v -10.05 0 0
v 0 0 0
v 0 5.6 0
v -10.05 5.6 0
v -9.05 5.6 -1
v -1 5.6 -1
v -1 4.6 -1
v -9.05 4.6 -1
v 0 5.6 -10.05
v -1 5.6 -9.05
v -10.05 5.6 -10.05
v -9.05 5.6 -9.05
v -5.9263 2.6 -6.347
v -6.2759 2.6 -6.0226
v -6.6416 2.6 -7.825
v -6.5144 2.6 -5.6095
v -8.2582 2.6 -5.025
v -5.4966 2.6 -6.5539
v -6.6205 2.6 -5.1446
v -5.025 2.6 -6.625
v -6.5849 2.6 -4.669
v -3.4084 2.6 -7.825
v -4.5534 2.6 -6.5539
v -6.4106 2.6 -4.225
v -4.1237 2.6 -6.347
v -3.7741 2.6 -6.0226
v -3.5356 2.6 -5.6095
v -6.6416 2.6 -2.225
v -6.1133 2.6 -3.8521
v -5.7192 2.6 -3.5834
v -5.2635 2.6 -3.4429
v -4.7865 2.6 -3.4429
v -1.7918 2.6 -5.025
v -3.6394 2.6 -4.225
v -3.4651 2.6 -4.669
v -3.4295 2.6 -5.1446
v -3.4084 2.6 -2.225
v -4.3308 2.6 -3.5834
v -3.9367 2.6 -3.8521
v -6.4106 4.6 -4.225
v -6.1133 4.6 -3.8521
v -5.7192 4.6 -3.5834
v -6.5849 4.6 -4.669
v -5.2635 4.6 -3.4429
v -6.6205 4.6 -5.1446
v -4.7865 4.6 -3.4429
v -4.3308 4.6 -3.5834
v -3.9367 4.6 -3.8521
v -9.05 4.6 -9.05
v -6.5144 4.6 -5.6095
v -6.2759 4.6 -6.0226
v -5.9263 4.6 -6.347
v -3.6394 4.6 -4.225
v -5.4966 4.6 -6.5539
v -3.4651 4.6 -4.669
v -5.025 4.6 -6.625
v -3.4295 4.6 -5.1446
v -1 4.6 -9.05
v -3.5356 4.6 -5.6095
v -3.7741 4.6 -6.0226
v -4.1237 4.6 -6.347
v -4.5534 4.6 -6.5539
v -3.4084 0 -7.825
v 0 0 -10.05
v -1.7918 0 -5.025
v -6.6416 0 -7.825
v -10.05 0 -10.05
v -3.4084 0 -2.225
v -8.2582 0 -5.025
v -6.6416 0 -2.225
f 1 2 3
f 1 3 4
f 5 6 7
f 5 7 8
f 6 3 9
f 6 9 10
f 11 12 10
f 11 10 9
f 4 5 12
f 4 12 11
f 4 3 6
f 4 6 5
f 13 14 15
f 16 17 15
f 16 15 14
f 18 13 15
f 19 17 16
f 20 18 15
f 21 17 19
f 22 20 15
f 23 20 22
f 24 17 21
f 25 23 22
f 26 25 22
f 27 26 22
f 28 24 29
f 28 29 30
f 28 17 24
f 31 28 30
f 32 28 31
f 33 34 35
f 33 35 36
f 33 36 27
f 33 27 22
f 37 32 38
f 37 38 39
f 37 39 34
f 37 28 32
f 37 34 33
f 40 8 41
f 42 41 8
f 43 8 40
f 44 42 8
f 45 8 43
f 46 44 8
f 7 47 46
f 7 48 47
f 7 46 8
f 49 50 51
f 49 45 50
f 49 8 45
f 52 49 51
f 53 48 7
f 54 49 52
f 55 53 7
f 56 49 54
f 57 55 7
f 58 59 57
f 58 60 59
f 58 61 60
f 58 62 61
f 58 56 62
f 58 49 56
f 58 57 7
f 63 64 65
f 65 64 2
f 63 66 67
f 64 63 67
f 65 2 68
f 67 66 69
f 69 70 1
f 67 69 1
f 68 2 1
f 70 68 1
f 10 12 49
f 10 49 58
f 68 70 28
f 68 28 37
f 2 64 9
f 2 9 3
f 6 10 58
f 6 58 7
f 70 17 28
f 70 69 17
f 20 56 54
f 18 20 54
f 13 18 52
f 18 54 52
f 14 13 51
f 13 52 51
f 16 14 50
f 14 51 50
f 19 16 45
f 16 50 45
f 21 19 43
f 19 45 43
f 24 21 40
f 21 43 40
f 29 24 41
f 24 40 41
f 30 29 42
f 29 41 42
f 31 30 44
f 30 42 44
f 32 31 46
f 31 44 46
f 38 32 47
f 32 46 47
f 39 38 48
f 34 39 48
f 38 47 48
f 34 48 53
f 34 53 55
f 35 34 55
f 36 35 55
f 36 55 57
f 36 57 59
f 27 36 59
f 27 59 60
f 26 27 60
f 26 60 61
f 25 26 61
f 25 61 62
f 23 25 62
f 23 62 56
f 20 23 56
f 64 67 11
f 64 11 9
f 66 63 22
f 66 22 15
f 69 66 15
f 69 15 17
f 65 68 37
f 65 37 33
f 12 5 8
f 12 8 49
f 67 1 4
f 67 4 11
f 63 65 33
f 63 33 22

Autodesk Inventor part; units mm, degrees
ref_plane "YZ Plane" through (0, 0, 0) normal (1, 0, 0) x (0, 1, 0)
ref_plane "XZ Plane" through (0, 0, 0) normal (0, 1, 0) x (-1, 0, 0)
ref_plane "XY Plane" through (0, 0, 0) normal (0, 0, 1) x (1, 0, 0)
sketch "Эскиз1" plane through (0, 0, 0) normal (0, 1, 0) x (-1, 0, 0)
  line L0 (0, 0) -> (10.05, 0)
  line L1 (10.05, 0) -> (10.05, -10.05)
  line L2 (10.05, -10.05) -> (0, -10.05)
  line L3 (0, -10.05) -> (0, 0)
  dimension "d0" = 10.05
  dimension "d1" = 10.05
extrude "Выдавливание1" add sketch "Эскиз1" along normal blind 5.6
sketch "Эскиз2" plane through (0, 5.6, 0) normal (0, 1, 0) x (1, 0, 0)
  line L0 (-10.05, 10.05) -> (-10.05, 0) projected
  line L1 (-10.05, 5.025) -> (0, 5.025)
  line L2 (0, 0) -> (0, 10.05) projected
  line L3 (-1, 1) -> (-9.05, 1)
  line L4 (-9.05, 1) -> (-9.05, 9.05)
  line L5 (-9.05, 9.05) -> (-1, 9.05)
  line L6 (-1, 9.05) -> (-1, 1)
  line L7 (-1, 1) -> (-9.05, 9.05) construction
  line L8 (-9.05, 1) -> (-1, 9.05) construction
  point P0 (-5.025, 5.025)
  dimension "d4" = 10.05
  dimension "d5" = 10.05
  dimension "d6" = 8.05
  dimension "d7" = 8.05
extrude "Выдавливание2" cut sketch "Эскиз2" against normal blind 1
sketch "Эскиз3" plane through (0, 0, 0) normal (0, -1, 0) x (1, 0, 0)
  line L0 (0, 0) -> (0, -10.05) projected
  line L1 (0, -5.025) -> (-10.05, -5.025)
  line L2 (-10.05, -10.05) -> (-10.05, 0) projected
  point P0 (-5.025, -5.025)
hole "Отверстие1" at (-5.025, 0, -5.025) direction (0, 1, 0) diameter 3.2 end through all
sketch "Эскиз4" plane through (0, 0, 0) normal (0, -1, 0) x (1, 0, 0)
  circle A0 centre (-5.025, -5.025) radius 1.6 projected
  line L0 (-6.6416, -7.825) -> (-8.2582, -5.025)
  line L1 (-8.2582, -5.025) -> (-6.6416, -2.225)
  line L2 (-6.6416, -2.225) -> (-3.4084, -2.225)
  line L3 (-3.4084, -2.225) -> (-1.7918, -5.025)
  line L4 (-1.7918, -5.025) -> (-3.4084, -7.825)
  line L5 (-3.4084, -7.825) -> (-6.6416, -7.825)
  point P0 (0, 0)
  dimension "d17" = 5.6
extrude "Выдавливание3" cut sketch "Эскиз4" against normal blind 2.6 contours A0 | L0 L1 L2 L3 L4 L5
properties part number "Тестовая модель (деталь в деталь)"
